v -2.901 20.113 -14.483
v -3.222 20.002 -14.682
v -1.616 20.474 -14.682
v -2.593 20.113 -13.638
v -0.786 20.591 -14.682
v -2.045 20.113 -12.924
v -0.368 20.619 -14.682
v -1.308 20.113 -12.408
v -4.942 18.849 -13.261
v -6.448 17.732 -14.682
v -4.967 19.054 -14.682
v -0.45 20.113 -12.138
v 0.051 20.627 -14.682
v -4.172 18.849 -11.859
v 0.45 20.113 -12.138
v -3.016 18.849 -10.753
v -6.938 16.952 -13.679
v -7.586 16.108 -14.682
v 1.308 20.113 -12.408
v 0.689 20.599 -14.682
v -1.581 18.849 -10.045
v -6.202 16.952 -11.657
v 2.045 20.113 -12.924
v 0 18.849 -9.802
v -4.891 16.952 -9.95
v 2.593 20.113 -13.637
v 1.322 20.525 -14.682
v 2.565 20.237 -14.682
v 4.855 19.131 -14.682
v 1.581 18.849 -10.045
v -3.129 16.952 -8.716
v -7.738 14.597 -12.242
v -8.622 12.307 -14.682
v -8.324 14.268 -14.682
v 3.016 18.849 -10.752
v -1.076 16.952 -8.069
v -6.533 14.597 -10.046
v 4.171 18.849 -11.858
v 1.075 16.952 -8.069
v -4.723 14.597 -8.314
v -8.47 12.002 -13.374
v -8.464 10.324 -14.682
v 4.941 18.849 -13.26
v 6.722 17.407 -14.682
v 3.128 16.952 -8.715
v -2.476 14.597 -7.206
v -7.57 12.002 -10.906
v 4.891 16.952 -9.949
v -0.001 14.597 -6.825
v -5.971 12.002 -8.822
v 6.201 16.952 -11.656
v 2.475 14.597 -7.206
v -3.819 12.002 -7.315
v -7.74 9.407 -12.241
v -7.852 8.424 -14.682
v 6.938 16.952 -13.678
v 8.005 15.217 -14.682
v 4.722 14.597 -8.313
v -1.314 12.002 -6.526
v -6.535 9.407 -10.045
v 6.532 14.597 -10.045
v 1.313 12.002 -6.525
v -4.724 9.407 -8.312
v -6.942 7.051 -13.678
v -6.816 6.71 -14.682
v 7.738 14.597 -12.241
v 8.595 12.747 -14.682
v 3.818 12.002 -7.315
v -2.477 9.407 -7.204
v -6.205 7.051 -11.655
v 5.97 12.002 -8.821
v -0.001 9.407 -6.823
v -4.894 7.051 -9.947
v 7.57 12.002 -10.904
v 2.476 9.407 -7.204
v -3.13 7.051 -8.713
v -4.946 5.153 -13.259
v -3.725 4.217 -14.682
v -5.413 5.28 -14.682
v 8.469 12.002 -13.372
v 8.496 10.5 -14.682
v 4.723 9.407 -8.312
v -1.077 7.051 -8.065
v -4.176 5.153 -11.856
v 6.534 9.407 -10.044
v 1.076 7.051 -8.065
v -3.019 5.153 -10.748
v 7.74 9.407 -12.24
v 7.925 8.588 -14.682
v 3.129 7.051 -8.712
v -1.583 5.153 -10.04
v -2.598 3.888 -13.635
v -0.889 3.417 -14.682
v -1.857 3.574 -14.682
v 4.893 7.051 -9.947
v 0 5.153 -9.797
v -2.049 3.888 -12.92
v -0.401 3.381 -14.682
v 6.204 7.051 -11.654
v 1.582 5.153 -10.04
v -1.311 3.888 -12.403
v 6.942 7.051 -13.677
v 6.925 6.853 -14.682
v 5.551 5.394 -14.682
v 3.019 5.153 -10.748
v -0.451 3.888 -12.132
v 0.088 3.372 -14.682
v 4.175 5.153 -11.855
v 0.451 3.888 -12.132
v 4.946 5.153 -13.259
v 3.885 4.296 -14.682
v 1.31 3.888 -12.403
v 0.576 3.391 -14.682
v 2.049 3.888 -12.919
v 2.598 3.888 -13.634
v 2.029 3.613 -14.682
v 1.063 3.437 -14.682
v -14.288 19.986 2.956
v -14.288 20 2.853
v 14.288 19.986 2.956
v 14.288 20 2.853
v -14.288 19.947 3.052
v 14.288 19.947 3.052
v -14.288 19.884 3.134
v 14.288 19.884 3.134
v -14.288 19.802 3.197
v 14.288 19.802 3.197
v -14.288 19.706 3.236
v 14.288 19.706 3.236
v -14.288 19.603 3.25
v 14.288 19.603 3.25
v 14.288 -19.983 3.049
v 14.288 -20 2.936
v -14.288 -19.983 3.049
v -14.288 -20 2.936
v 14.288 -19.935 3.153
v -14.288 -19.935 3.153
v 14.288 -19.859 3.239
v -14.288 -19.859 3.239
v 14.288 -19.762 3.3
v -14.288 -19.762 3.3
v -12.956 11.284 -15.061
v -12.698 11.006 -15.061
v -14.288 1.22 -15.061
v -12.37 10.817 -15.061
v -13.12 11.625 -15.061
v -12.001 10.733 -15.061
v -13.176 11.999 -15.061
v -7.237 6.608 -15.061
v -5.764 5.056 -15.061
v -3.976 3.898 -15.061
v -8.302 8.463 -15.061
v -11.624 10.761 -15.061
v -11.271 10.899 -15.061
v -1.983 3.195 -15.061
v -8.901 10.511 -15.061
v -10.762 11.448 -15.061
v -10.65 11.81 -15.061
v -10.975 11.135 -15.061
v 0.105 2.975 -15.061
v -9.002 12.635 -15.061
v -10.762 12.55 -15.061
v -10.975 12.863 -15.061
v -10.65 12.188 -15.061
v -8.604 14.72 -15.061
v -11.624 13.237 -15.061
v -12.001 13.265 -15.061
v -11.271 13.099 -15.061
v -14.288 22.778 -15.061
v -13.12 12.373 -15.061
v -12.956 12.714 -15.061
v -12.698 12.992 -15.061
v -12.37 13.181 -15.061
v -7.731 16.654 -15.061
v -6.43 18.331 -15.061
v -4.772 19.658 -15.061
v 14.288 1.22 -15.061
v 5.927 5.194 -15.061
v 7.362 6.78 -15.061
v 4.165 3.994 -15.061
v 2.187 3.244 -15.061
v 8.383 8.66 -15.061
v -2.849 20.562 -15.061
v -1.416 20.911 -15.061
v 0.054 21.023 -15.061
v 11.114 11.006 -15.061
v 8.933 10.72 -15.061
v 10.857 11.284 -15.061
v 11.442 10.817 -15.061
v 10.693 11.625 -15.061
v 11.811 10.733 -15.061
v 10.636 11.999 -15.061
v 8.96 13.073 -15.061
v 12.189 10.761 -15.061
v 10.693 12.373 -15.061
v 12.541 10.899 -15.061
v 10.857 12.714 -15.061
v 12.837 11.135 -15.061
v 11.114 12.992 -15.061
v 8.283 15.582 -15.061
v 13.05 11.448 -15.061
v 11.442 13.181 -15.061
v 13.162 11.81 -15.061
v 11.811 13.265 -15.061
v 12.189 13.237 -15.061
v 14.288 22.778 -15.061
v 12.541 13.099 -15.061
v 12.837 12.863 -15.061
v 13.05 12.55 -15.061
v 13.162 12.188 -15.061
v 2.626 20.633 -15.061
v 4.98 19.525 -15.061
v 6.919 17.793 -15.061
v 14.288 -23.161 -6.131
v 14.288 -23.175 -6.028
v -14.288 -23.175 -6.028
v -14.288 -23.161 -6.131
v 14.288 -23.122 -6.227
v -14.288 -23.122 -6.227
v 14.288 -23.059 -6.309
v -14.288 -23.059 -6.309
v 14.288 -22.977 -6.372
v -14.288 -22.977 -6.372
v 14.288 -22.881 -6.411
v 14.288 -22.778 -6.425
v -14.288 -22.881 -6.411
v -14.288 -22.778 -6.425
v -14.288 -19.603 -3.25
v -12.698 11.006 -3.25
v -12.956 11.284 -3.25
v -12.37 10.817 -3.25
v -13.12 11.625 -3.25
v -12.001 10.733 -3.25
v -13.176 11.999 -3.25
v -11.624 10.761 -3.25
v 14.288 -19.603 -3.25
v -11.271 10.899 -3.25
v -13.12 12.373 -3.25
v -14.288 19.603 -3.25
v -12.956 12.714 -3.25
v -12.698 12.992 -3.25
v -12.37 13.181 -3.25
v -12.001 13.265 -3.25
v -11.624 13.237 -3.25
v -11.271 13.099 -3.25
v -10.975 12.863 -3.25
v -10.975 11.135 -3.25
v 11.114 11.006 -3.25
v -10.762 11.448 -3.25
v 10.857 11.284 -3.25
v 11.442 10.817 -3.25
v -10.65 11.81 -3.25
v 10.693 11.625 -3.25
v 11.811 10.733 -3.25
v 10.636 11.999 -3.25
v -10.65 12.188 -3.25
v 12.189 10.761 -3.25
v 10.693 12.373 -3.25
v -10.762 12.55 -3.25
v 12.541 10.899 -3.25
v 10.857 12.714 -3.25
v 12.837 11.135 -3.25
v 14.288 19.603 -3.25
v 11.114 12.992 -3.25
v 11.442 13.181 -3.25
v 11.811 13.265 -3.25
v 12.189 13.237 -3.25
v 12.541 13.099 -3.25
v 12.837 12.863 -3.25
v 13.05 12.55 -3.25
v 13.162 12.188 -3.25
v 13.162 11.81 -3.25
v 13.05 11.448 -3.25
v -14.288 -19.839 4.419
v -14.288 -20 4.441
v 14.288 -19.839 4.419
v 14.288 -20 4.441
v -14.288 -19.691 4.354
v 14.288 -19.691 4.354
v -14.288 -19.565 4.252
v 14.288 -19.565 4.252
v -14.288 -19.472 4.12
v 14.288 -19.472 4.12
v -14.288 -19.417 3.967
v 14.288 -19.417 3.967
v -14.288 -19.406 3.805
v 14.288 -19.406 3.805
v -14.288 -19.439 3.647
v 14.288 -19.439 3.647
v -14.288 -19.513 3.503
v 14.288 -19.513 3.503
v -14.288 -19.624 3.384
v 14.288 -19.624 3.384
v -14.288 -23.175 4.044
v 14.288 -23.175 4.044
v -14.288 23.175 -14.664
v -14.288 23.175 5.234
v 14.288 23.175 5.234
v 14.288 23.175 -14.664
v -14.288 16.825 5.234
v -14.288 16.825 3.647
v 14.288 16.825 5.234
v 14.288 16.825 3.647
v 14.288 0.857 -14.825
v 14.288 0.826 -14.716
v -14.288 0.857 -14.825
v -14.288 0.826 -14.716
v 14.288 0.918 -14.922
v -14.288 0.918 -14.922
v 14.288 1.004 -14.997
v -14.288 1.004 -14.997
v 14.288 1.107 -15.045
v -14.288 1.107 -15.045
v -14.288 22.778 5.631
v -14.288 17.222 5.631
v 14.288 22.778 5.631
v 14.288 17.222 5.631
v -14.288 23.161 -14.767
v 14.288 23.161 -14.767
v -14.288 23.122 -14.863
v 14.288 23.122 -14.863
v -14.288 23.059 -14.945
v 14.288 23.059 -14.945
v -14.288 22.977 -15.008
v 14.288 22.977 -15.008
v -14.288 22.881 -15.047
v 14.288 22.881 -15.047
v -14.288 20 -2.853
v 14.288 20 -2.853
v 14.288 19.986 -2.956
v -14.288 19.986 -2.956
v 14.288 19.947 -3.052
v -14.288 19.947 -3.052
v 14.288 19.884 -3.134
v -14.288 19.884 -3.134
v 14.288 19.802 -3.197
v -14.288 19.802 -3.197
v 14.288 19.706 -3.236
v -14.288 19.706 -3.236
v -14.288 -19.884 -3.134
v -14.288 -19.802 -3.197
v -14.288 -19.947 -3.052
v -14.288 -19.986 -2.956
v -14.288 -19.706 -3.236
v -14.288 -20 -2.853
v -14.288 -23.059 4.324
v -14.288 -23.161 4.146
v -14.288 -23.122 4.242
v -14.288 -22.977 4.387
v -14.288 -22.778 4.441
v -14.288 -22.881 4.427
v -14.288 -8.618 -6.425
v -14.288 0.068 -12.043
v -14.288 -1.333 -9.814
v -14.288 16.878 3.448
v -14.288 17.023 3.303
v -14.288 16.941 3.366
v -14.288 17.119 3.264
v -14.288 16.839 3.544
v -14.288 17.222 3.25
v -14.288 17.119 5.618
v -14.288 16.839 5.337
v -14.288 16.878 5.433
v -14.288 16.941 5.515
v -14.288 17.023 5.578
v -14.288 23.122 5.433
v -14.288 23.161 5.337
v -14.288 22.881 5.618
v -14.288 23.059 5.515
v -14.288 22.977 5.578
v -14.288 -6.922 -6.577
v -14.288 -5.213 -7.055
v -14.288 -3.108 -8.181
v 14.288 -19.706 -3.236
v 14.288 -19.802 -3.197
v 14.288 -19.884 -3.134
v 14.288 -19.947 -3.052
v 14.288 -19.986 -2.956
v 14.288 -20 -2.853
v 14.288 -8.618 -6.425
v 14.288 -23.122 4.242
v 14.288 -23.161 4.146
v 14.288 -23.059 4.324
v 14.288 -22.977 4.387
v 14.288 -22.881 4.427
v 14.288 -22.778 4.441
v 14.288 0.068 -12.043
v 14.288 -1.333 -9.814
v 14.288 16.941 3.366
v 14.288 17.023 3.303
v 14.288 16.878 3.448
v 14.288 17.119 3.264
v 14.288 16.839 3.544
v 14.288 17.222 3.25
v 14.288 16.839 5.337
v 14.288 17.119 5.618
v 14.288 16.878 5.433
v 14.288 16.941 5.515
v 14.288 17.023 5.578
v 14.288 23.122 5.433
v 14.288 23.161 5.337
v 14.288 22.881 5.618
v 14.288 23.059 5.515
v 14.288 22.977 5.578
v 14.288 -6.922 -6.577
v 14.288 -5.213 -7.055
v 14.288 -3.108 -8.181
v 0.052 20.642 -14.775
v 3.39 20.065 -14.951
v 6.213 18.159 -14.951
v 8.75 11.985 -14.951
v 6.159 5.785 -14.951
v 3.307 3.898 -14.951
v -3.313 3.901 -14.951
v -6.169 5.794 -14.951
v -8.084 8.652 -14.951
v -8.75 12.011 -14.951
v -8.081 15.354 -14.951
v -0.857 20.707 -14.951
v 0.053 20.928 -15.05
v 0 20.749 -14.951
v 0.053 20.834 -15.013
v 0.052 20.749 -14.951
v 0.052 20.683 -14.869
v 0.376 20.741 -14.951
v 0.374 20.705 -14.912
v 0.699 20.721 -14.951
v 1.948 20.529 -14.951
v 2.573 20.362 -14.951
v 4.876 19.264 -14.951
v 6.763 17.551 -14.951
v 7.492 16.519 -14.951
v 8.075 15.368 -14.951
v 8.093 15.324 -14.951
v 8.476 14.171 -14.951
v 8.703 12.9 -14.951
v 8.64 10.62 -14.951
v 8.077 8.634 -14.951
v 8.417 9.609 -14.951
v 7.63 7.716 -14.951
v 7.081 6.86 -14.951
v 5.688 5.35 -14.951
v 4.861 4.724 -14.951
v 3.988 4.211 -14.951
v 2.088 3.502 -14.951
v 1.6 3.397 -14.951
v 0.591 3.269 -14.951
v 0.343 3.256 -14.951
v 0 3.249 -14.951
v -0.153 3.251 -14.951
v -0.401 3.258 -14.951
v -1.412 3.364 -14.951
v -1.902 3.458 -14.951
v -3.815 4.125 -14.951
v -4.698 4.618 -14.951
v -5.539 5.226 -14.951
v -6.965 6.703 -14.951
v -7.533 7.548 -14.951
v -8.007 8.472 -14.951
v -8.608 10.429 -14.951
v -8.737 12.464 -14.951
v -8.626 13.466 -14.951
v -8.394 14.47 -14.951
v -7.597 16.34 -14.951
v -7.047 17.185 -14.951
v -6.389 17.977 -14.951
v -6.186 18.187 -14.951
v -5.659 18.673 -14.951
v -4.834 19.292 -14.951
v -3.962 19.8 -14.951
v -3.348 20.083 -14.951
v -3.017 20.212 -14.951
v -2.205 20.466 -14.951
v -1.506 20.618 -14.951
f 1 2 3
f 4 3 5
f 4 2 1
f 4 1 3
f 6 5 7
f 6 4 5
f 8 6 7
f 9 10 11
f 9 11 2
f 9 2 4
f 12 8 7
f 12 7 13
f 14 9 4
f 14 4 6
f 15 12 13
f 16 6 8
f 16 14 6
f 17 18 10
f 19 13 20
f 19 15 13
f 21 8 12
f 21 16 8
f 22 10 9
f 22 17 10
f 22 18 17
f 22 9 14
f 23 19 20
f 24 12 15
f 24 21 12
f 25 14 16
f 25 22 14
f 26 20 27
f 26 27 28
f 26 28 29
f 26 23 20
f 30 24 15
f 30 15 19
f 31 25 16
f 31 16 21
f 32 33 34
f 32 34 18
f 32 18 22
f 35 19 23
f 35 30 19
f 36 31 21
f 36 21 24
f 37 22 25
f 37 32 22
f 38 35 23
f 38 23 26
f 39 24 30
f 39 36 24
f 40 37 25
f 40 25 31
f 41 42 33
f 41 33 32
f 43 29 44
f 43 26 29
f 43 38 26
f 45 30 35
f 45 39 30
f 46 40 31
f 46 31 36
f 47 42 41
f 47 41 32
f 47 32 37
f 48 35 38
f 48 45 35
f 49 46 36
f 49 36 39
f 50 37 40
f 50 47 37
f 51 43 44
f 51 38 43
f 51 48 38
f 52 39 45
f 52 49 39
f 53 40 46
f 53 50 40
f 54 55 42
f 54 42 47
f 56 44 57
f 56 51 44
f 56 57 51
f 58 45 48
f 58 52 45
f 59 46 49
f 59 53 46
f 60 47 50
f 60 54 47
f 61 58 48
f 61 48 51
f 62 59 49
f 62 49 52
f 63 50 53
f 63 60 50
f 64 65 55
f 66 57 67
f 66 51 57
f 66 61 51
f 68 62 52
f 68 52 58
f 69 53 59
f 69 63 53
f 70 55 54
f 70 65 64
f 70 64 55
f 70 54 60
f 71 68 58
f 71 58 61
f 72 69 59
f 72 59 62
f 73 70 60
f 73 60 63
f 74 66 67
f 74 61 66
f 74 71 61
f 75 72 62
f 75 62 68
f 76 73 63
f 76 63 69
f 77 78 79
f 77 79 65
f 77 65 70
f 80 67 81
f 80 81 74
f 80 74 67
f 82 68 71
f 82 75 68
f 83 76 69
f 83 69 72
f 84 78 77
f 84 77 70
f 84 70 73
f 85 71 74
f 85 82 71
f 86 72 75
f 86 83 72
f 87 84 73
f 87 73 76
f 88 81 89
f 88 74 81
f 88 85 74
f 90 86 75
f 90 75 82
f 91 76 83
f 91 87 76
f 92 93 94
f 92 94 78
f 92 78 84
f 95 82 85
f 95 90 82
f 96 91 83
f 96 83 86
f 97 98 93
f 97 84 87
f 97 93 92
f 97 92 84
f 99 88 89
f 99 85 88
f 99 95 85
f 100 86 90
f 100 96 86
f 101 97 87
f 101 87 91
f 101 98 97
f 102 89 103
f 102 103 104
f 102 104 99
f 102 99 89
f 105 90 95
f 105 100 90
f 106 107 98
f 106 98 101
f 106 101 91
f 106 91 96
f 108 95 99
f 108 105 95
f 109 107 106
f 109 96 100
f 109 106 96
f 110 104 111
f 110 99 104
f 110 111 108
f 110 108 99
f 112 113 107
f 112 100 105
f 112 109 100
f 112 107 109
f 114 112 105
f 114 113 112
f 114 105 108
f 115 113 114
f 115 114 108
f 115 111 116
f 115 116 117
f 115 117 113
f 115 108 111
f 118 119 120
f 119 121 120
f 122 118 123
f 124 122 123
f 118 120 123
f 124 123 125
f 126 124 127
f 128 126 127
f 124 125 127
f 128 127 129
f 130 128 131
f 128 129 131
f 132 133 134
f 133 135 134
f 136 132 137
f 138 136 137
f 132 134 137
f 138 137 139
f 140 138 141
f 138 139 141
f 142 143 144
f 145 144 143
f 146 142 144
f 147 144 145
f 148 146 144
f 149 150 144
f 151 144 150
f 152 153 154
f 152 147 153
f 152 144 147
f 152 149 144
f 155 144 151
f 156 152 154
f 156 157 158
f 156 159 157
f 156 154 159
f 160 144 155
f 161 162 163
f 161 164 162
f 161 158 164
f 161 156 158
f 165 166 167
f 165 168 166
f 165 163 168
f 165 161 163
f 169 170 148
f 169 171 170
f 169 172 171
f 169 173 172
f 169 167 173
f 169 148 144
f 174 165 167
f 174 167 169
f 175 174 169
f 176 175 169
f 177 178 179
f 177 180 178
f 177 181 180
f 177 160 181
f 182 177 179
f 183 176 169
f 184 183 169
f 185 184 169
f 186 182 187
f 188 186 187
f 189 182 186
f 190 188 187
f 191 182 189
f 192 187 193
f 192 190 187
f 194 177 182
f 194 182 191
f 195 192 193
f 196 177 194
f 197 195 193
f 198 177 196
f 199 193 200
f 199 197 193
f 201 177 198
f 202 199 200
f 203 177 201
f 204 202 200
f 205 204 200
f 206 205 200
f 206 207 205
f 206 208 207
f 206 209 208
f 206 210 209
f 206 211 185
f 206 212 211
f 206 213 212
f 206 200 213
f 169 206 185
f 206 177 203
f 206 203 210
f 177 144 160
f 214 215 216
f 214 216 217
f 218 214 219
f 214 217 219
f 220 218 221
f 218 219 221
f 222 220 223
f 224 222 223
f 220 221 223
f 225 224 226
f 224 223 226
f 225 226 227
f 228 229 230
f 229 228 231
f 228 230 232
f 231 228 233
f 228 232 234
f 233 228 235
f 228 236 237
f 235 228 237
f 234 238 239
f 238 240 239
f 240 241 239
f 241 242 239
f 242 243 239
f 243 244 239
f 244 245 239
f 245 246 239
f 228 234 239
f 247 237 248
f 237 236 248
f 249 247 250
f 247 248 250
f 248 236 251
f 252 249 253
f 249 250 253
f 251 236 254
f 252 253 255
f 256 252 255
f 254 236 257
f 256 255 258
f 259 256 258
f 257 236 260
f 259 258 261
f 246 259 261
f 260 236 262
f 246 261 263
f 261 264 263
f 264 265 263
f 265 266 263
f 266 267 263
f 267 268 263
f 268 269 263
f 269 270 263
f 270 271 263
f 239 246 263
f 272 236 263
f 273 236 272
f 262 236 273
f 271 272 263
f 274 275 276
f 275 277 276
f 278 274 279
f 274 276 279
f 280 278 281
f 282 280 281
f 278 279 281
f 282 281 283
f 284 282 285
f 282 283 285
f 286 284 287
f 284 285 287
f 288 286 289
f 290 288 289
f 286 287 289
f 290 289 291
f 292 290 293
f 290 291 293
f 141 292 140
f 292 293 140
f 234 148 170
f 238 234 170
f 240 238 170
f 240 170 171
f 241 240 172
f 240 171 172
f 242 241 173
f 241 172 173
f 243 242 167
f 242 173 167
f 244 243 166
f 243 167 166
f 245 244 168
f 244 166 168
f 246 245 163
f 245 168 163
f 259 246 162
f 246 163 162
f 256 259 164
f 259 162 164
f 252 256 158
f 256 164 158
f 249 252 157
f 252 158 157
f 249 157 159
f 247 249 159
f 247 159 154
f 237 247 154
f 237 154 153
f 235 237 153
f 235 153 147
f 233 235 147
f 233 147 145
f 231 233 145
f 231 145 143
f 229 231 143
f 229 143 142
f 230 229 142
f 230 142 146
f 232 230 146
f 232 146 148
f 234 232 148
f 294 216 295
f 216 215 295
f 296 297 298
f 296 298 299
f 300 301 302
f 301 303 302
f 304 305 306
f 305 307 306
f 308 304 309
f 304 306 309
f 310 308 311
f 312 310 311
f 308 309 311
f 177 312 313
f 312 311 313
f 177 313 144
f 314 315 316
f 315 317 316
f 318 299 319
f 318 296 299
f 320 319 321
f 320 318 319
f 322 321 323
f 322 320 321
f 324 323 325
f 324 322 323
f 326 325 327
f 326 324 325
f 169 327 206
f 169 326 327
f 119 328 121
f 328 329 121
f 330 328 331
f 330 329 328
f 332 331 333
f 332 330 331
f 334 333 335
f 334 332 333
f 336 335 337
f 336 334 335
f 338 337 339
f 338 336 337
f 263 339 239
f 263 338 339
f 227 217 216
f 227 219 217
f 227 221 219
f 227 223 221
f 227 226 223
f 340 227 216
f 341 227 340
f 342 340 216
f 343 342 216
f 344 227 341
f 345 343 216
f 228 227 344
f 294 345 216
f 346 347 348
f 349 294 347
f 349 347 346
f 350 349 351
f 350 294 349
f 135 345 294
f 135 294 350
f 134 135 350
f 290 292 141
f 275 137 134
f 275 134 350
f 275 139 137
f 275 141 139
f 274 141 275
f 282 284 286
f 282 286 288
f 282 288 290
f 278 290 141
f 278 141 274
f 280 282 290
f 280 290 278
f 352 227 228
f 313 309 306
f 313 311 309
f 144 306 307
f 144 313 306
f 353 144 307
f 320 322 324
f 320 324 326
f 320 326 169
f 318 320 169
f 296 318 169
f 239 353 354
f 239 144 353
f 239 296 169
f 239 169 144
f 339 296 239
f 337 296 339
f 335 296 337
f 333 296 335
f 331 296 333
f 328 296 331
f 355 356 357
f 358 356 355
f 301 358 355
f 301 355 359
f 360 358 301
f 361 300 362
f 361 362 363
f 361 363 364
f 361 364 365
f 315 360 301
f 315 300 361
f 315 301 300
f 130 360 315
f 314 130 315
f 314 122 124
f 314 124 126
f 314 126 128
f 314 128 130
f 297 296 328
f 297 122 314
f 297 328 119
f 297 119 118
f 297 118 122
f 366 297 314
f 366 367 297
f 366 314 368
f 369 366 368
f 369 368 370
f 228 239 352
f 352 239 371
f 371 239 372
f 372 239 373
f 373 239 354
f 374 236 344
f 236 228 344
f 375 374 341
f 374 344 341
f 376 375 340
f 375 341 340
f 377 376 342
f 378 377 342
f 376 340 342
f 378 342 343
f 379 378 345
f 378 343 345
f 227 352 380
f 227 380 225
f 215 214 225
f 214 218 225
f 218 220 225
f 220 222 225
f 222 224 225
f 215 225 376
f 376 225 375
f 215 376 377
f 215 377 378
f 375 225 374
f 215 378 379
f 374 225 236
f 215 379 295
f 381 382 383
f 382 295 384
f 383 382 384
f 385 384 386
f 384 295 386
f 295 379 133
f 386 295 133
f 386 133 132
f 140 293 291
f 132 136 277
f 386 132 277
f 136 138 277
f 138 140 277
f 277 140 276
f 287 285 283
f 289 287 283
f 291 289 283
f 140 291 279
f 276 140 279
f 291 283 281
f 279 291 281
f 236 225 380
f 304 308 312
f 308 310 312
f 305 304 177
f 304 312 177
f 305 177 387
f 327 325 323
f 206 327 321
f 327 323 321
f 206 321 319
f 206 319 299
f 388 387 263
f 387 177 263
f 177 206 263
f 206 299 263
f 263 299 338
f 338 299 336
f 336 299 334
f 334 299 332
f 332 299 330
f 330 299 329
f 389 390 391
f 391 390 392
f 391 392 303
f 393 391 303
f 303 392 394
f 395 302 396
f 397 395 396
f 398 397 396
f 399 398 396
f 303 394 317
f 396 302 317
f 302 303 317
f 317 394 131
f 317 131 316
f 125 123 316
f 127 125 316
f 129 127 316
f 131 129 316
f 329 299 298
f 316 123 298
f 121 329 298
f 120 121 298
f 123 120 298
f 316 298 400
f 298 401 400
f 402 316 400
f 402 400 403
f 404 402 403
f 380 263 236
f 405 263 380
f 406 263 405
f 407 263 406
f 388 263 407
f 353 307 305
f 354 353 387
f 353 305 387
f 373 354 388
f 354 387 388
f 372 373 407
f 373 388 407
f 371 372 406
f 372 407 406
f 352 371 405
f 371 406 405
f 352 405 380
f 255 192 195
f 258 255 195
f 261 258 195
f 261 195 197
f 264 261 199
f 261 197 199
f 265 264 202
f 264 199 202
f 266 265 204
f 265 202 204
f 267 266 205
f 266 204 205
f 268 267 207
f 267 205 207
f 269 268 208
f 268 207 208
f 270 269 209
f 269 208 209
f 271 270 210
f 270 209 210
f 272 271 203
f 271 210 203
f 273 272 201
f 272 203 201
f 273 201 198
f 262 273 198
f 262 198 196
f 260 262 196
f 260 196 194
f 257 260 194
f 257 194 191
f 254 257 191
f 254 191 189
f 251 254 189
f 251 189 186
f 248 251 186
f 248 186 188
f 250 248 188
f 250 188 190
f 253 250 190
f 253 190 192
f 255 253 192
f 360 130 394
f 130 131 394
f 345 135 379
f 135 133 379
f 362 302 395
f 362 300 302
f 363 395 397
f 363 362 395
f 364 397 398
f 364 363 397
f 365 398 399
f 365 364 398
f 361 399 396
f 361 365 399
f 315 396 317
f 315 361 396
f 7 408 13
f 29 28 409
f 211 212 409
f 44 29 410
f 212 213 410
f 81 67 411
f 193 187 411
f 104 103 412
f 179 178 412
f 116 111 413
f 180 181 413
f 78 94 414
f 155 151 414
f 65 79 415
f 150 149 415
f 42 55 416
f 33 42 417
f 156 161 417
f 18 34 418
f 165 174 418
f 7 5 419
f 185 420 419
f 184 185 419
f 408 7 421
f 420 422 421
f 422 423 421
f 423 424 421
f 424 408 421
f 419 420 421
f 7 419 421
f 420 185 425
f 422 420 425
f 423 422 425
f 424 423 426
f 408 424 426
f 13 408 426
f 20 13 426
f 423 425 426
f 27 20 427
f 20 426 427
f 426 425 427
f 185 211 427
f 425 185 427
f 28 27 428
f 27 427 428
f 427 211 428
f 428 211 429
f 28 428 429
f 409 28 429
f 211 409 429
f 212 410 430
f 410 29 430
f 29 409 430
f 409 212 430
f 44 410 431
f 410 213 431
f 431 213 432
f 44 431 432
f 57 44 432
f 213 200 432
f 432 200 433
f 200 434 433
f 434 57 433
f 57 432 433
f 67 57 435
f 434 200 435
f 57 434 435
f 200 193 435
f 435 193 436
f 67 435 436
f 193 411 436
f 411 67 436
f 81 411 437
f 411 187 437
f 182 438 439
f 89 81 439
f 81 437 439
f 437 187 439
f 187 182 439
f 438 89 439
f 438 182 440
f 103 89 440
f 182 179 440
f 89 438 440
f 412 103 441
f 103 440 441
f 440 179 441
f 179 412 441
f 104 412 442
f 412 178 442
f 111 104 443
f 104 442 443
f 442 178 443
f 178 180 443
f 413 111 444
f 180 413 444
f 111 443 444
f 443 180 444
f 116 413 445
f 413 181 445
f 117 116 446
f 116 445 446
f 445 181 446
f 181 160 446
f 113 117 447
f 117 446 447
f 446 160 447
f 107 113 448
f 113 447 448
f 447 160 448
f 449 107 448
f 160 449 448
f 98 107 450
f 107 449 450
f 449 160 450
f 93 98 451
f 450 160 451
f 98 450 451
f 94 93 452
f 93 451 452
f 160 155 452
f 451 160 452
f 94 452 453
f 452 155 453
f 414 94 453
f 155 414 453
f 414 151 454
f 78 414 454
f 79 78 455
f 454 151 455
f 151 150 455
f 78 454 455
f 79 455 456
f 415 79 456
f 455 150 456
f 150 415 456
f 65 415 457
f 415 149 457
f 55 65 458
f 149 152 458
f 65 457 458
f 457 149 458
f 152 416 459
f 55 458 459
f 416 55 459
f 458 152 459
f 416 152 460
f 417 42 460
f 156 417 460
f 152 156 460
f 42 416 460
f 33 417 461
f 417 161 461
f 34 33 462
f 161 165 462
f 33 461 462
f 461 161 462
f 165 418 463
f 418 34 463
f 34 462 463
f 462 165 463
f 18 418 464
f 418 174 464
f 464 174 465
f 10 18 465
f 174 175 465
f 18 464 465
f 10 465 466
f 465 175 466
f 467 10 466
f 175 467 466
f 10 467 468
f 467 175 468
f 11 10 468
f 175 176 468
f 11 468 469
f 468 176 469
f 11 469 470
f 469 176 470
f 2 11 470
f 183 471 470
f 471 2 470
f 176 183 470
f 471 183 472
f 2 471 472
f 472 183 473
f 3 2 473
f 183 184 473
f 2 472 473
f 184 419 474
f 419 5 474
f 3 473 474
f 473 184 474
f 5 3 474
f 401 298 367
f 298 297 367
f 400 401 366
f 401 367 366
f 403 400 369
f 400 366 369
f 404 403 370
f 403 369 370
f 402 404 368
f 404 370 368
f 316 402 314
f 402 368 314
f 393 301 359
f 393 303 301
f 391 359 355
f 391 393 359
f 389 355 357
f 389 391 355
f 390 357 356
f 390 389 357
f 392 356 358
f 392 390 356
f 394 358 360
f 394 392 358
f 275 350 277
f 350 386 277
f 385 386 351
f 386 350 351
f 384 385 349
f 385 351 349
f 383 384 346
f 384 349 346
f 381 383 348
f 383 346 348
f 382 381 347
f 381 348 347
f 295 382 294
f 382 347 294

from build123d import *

# Parameters (mm, degrees)
BOSS_EXTRUDE1_DEPTH = 14.2875
FILLET1_R           = 0.396875
BOSS_EXTRUDE2_DEPTH = 14.2875
FILLET2_R           = 0.396875
SKETCH5_R           = 1.27
CUT_EXTRUDE1_DEPTH  = 12.7
FILLET3_R           = 9.525


with BuildPart() as part:
    # Sketch2 → Boss-Extrude1 (new body, symmetric)
    with BuildSketch(Plane(origin=(0, 0, 0), x_dir=(0, 0, -1), z_dir=(1, 0, 0))):
        with BuildLine():
            Line((-3.25, 16.825), (-5.63125, 16.825))
            Line((-5.63125, 16.825), (-5.63125, 23.175))
            Line((-5.63125, 23.175), (6.425, 23.175))
            Line((6.425, 23.175), (6.425, -23.175))
            Line((6.425, -23.175), (-4.440625, -23.175))
            Line((-4.440625, -23.175), (-4.440625, -20))
            ThreePointArc((-4.440625, -20), (-3.8453125, -19.4046875), (-3.25, -20))
            Line((-3.25, -20), (3.25, -20))
            Line((3.25, -20), (3.25, 20))
            Line((3.25, 20), (-3.25, 20))
            Line((-3.25, 20), (-3.25, 16.825))
        make_face()
    extrude(amount=BOSS_EXTRUDE1_DEPTH, both=True)

    # Fillet1
    fillet1_edges = [part.edges().sort_by_distance(p)[0] for p in [
        (0, 20, -3.25),
        (0, 20, 3.25),
        (0, 16.825, 3.25),
        (0, 16.825, 5.63125),
        (0, 23.175, 5.63125),
        (0, -23.175, 4.440625),
        (0, -20, 3.25),
        (0, -20, -3.25),
    ]]
    fillet(fillet1_edges, radius=FILLET1_R)

    # Sketch3 → Boss-Extrude2 (add, symmetric)
    with BuildSketch(Plane(origin=(0, 0, 0), x_dir=(0, 0, -1), z_dir=(1, 0, 0))):
        Polygon((6.425, 23.175), (15.061, 23.175), (15.061, 20.635), (15.061, 3.363), (15.061, 0.823), (6.425, 0.823), align=None)
    extrude(amount=BOSS_EXTRUDE2_DEPTH, both=True)

    # Sketch4 → Cut-Revolve3 (revolve, cut)
    with BuildSketch(Plane(origin=(0, 0, 0), x_dir=(0, 0, -1), z_dir=(1, 0, 0))):
        with BuildLine():
            Line((15.061, 3.363), (15.061, 20.635))
            ThreePointArc((15.061, 20.635), (6.425, 11.999), (15.061, 3.363))
        make_face()
    revolve(axis=Axis((0, 3.363, -15.061), (0, 1, 0)), mode=Mode.SUBTRACT)

    # Fillet2
    fillet2_edges = [part.edges().sort_by_distance(p)[0] for p in [
        (0, -23.175, -6.425),
        (0, 23.175, -15.061),
        (0, 0.823, -15.061),
        (8.636, 11.999, -15.061),
    ]]
    fillet(fillet2_edges, radius=FILLET2_R)

    # Sketch5 → Cut-Extrude1 (cut)
    with BuildSketch(Plane(origin=(0, 0, -15.061), x_dir=(-1, 0, 0), z_dir=(0, 0, -1))):
        with Locations((-11.90625, 11.999)):
            Circle(SKETCH5_R)
        with Locations((11.90625, 11.999)):
            Circle(SKETCH5_R)
    extrude(amount=-CUT_EXTRUDE1_DEPTH, mode=Mode.SUBTRACT)

    # Fillet3
    fillet3_edges = [part.edges().sort_by_distance(p)[0] for p in [
        (0, 0.823, -6.425),
    ]]
    fillet(fillet3_edges, radius=FILLET3_R)


solid = part.part
